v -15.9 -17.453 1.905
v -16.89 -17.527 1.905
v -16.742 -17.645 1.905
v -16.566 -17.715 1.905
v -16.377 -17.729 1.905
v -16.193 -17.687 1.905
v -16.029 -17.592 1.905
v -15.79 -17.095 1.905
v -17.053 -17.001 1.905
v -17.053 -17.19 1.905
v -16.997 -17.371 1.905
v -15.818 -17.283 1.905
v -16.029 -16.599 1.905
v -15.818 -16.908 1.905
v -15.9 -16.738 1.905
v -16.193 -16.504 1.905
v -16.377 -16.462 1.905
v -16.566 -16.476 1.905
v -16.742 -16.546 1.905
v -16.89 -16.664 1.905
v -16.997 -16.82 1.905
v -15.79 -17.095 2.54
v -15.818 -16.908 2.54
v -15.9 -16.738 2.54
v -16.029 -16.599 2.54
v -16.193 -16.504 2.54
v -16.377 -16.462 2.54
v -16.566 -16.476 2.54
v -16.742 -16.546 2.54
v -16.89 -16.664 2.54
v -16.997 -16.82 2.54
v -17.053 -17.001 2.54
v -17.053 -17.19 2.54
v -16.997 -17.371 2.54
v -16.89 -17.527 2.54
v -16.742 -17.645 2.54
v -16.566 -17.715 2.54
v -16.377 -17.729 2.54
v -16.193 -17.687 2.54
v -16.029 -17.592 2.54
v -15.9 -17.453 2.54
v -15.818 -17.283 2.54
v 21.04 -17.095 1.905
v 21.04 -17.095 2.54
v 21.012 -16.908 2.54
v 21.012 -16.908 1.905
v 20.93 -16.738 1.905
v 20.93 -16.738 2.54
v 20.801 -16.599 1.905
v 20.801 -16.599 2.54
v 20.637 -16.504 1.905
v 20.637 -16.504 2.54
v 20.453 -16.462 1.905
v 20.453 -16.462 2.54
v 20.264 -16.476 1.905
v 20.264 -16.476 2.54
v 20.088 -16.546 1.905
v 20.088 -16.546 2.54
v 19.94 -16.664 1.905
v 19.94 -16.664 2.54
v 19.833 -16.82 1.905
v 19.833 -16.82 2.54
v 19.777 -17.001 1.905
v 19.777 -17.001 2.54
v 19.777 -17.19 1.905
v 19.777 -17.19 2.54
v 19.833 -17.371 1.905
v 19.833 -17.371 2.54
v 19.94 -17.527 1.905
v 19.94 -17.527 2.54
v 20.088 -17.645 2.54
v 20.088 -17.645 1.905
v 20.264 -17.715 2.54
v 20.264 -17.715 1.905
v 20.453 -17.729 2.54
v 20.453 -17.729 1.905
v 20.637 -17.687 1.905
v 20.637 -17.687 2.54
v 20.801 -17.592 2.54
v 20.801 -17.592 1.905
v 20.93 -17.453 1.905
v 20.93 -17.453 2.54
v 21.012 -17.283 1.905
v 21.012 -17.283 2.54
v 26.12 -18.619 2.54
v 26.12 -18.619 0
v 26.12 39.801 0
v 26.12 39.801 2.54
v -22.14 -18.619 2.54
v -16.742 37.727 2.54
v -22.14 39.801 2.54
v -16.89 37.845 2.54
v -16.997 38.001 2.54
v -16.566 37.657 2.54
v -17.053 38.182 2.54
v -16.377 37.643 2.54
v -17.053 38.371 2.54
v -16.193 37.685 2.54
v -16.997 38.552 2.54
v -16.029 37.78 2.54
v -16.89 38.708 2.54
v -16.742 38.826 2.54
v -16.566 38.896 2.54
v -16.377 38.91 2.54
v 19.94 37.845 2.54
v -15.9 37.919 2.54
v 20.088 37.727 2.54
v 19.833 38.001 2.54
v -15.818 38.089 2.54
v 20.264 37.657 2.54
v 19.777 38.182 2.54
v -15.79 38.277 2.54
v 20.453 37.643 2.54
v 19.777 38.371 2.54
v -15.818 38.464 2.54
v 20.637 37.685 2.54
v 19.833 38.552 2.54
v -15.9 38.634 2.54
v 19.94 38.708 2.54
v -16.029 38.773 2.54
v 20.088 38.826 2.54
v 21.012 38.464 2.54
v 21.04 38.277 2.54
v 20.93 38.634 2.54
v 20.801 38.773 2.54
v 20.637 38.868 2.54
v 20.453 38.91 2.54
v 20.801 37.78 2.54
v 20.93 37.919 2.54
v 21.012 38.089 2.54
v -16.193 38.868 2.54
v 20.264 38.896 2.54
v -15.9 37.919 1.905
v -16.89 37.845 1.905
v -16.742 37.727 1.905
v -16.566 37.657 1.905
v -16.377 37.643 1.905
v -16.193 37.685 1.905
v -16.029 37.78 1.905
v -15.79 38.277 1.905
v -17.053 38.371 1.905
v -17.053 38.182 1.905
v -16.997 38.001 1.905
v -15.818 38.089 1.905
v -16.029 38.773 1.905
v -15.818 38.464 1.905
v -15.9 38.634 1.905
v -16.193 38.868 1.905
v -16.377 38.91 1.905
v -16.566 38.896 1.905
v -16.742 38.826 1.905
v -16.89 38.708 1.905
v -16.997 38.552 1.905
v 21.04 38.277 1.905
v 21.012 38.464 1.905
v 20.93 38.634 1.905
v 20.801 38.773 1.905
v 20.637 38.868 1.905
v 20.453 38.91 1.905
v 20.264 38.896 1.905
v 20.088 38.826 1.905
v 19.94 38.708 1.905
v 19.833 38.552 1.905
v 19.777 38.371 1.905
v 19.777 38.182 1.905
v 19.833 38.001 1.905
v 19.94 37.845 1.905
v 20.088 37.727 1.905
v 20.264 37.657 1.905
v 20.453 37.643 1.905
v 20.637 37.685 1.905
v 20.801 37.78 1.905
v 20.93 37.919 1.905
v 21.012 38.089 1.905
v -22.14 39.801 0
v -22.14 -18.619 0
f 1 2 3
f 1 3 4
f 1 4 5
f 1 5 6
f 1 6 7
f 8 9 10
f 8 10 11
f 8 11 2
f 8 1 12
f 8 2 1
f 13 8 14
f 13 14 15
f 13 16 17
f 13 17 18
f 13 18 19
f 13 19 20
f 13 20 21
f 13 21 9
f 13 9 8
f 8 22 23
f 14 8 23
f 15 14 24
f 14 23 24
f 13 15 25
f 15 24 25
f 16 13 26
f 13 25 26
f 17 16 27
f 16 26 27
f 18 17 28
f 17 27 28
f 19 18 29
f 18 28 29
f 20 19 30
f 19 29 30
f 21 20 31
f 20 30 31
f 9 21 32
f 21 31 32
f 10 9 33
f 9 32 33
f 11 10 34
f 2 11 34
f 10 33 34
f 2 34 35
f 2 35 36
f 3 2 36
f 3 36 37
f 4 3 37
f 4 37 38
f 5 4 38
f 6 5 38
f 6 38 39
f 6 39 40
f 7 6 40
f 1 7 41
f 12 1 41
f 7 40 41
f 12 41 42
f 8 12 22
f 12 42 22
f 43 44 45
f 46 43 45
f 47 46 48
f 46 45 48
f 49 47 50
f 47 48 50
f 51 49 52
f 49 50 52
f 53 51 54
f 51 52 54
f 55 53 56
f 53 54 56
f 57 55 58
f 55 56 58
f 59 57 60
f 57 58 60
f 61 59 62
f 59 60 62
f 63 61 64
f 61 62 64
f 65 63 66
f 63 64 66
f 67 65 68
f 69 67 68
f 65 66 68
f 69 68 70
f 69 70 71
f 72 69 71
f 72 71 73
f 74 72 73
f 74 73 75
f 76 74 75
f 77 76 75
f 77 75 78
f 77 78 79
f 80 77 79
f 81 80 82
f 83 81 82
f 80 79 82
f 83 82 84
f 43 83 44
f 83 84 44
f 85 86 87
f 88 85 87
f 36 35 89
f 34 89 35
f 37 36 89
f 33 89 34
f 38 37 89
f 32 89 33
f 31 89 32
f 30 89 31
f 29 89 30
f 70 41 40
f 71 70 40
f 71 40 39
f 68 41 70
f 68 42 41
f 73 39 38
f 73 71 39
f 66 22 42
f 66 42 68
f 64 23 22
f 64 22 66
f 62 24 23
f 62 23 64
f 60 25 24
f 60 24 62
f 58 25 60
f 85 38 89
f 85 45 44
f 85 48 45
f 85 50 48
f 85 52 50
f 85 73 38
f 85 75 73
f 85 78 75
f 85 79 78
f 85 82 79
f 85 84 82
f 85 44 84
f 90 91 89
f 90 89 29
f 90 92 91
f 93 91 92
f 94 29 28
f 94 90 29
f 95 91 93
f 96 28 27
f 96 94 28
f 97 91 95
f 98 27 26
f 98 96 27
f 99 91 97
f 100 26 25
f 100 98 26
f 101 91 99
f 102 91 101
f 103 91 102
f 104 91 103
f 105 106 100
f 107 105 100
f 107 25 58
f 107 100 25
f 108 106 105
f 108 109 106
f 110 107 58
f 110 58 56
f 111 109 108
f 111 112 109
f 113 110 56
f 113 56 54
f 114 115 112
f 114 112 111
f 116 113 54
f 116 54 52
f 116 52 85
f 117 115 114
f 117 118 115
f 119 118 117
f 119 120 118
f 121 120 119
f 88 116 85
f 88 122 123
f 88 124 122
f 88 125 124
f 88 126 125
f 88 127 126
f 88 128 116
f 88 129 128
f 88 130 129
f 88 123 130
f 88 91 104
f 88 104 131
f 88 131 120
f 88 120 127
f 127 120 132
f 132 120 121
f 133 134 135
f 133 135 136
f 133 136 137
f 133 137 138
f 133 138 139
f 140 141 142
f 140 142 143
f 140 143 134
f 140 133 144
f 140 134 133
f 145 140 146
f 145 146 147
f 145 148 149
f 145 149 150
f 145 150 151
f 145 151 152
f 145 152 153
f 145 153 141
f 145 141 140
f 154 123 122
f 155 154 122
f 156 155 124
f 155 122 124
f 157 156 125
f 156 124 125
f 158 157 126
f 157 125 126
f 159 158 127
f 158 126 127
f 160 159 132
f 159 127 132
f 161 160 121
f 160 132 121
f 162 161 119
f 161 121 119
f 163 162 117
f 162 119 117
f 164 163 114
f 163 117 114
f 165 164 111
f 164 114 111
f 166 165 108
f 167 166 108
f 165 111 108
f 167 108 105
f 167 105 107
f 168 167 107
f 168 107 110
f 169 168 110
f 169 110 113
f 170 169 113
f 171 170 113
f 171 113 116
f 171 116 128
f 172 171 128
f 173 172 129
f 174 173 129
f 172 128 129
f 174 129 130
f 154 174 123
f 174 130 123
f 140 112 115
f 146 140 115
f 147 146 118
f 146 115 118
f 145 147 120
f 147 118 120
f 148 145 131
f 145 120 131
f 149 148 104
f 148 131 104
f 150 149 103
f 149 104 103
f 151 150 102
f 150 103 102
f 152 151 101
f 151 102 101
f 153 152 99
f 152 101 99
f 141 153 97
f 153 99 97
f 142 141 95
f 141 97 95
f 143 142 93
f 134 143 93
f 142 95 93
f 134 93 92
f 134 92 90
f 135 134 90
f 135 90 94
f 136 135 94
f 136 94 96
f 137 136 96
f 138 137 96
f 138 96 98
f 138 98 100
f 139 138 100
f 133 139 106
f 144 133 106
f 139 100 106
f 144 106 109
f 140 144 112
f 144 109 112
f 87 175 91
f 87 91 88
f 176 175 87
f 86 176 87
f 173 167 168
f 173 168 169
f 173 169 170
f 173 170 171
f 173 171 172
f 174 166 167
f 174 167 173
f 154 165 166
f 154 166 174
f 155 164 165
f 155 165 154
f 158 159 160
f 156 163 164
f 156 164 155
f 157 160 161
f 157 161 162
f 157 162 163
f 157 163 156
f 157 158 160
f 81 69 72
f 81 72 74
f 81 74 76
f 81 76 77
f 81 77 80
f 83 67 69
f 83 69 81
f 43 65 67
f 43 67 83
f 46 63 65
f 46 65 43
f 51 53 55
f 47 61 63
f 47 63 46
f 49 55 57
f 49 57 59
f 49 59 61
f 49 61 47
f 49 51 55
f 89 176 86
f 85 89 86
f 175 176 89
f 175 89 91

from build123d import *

# Parameters (mm, degrees)
F0_W     = 48.26
F0_H     = 58.42
F1_DEPTH = 2.54
F2_R     = 0.635
F3_DEPTH = 0.635
F4_R     = 0.635
F7_DEPTH = 0.635
F6_R     = 0.635
F8_DEPTH = 0.635
F5_R     = 0.635
F9_DEPTH = 0.635


with BuildPart() as f1:
    # F0 (on Top) → F1 (new body)
    with BuildSketch(Plane.XY):
        with Locations((1.990296, 10.590553)):
            Rectangle(F0_W, F0_H)
    extrude(amount=F1_DEPTH)

    # F2 (on face) → F3 (cut)
    with BuildSketch(Plane.XY.offset(2.54)):
        with Locations((20.405296, 38.276553)):
            Circle(F2_R)
    extrude(amount=-F3_DEPTH, mode=Mode.SUBTRACT)

    # F4 (on face) → F7 (cut)
    with BuildSketch(Plane.XY.offset(2.54)):
        with Locations((-16.424704, 38.276553)):
            Circle(F4_R)
    extrude(amount=-F7_DEPTH, mode=Mode.SUBTRACT)

    # F6 (on face) → F8 (cut)
    with BuildSketch(Plane.XY.offset(2.54)):
        with Locations((20.405296, -17.095447)):
            Circle(F6_R)
    extrude(amount=-F8_DEPTH, mode=Mode.SUBTRACT)

    # F5 (on face) → F9 (cut)
    with BuildSketch(Plane.XY.offset(2.54)):
        with Locations((-16.424704, -17.095447)):
            Circle(F5_R)
    extrude(amount=-F9_DEPTH, mode=Mode.SUBTRACT)


solid = f1.part
